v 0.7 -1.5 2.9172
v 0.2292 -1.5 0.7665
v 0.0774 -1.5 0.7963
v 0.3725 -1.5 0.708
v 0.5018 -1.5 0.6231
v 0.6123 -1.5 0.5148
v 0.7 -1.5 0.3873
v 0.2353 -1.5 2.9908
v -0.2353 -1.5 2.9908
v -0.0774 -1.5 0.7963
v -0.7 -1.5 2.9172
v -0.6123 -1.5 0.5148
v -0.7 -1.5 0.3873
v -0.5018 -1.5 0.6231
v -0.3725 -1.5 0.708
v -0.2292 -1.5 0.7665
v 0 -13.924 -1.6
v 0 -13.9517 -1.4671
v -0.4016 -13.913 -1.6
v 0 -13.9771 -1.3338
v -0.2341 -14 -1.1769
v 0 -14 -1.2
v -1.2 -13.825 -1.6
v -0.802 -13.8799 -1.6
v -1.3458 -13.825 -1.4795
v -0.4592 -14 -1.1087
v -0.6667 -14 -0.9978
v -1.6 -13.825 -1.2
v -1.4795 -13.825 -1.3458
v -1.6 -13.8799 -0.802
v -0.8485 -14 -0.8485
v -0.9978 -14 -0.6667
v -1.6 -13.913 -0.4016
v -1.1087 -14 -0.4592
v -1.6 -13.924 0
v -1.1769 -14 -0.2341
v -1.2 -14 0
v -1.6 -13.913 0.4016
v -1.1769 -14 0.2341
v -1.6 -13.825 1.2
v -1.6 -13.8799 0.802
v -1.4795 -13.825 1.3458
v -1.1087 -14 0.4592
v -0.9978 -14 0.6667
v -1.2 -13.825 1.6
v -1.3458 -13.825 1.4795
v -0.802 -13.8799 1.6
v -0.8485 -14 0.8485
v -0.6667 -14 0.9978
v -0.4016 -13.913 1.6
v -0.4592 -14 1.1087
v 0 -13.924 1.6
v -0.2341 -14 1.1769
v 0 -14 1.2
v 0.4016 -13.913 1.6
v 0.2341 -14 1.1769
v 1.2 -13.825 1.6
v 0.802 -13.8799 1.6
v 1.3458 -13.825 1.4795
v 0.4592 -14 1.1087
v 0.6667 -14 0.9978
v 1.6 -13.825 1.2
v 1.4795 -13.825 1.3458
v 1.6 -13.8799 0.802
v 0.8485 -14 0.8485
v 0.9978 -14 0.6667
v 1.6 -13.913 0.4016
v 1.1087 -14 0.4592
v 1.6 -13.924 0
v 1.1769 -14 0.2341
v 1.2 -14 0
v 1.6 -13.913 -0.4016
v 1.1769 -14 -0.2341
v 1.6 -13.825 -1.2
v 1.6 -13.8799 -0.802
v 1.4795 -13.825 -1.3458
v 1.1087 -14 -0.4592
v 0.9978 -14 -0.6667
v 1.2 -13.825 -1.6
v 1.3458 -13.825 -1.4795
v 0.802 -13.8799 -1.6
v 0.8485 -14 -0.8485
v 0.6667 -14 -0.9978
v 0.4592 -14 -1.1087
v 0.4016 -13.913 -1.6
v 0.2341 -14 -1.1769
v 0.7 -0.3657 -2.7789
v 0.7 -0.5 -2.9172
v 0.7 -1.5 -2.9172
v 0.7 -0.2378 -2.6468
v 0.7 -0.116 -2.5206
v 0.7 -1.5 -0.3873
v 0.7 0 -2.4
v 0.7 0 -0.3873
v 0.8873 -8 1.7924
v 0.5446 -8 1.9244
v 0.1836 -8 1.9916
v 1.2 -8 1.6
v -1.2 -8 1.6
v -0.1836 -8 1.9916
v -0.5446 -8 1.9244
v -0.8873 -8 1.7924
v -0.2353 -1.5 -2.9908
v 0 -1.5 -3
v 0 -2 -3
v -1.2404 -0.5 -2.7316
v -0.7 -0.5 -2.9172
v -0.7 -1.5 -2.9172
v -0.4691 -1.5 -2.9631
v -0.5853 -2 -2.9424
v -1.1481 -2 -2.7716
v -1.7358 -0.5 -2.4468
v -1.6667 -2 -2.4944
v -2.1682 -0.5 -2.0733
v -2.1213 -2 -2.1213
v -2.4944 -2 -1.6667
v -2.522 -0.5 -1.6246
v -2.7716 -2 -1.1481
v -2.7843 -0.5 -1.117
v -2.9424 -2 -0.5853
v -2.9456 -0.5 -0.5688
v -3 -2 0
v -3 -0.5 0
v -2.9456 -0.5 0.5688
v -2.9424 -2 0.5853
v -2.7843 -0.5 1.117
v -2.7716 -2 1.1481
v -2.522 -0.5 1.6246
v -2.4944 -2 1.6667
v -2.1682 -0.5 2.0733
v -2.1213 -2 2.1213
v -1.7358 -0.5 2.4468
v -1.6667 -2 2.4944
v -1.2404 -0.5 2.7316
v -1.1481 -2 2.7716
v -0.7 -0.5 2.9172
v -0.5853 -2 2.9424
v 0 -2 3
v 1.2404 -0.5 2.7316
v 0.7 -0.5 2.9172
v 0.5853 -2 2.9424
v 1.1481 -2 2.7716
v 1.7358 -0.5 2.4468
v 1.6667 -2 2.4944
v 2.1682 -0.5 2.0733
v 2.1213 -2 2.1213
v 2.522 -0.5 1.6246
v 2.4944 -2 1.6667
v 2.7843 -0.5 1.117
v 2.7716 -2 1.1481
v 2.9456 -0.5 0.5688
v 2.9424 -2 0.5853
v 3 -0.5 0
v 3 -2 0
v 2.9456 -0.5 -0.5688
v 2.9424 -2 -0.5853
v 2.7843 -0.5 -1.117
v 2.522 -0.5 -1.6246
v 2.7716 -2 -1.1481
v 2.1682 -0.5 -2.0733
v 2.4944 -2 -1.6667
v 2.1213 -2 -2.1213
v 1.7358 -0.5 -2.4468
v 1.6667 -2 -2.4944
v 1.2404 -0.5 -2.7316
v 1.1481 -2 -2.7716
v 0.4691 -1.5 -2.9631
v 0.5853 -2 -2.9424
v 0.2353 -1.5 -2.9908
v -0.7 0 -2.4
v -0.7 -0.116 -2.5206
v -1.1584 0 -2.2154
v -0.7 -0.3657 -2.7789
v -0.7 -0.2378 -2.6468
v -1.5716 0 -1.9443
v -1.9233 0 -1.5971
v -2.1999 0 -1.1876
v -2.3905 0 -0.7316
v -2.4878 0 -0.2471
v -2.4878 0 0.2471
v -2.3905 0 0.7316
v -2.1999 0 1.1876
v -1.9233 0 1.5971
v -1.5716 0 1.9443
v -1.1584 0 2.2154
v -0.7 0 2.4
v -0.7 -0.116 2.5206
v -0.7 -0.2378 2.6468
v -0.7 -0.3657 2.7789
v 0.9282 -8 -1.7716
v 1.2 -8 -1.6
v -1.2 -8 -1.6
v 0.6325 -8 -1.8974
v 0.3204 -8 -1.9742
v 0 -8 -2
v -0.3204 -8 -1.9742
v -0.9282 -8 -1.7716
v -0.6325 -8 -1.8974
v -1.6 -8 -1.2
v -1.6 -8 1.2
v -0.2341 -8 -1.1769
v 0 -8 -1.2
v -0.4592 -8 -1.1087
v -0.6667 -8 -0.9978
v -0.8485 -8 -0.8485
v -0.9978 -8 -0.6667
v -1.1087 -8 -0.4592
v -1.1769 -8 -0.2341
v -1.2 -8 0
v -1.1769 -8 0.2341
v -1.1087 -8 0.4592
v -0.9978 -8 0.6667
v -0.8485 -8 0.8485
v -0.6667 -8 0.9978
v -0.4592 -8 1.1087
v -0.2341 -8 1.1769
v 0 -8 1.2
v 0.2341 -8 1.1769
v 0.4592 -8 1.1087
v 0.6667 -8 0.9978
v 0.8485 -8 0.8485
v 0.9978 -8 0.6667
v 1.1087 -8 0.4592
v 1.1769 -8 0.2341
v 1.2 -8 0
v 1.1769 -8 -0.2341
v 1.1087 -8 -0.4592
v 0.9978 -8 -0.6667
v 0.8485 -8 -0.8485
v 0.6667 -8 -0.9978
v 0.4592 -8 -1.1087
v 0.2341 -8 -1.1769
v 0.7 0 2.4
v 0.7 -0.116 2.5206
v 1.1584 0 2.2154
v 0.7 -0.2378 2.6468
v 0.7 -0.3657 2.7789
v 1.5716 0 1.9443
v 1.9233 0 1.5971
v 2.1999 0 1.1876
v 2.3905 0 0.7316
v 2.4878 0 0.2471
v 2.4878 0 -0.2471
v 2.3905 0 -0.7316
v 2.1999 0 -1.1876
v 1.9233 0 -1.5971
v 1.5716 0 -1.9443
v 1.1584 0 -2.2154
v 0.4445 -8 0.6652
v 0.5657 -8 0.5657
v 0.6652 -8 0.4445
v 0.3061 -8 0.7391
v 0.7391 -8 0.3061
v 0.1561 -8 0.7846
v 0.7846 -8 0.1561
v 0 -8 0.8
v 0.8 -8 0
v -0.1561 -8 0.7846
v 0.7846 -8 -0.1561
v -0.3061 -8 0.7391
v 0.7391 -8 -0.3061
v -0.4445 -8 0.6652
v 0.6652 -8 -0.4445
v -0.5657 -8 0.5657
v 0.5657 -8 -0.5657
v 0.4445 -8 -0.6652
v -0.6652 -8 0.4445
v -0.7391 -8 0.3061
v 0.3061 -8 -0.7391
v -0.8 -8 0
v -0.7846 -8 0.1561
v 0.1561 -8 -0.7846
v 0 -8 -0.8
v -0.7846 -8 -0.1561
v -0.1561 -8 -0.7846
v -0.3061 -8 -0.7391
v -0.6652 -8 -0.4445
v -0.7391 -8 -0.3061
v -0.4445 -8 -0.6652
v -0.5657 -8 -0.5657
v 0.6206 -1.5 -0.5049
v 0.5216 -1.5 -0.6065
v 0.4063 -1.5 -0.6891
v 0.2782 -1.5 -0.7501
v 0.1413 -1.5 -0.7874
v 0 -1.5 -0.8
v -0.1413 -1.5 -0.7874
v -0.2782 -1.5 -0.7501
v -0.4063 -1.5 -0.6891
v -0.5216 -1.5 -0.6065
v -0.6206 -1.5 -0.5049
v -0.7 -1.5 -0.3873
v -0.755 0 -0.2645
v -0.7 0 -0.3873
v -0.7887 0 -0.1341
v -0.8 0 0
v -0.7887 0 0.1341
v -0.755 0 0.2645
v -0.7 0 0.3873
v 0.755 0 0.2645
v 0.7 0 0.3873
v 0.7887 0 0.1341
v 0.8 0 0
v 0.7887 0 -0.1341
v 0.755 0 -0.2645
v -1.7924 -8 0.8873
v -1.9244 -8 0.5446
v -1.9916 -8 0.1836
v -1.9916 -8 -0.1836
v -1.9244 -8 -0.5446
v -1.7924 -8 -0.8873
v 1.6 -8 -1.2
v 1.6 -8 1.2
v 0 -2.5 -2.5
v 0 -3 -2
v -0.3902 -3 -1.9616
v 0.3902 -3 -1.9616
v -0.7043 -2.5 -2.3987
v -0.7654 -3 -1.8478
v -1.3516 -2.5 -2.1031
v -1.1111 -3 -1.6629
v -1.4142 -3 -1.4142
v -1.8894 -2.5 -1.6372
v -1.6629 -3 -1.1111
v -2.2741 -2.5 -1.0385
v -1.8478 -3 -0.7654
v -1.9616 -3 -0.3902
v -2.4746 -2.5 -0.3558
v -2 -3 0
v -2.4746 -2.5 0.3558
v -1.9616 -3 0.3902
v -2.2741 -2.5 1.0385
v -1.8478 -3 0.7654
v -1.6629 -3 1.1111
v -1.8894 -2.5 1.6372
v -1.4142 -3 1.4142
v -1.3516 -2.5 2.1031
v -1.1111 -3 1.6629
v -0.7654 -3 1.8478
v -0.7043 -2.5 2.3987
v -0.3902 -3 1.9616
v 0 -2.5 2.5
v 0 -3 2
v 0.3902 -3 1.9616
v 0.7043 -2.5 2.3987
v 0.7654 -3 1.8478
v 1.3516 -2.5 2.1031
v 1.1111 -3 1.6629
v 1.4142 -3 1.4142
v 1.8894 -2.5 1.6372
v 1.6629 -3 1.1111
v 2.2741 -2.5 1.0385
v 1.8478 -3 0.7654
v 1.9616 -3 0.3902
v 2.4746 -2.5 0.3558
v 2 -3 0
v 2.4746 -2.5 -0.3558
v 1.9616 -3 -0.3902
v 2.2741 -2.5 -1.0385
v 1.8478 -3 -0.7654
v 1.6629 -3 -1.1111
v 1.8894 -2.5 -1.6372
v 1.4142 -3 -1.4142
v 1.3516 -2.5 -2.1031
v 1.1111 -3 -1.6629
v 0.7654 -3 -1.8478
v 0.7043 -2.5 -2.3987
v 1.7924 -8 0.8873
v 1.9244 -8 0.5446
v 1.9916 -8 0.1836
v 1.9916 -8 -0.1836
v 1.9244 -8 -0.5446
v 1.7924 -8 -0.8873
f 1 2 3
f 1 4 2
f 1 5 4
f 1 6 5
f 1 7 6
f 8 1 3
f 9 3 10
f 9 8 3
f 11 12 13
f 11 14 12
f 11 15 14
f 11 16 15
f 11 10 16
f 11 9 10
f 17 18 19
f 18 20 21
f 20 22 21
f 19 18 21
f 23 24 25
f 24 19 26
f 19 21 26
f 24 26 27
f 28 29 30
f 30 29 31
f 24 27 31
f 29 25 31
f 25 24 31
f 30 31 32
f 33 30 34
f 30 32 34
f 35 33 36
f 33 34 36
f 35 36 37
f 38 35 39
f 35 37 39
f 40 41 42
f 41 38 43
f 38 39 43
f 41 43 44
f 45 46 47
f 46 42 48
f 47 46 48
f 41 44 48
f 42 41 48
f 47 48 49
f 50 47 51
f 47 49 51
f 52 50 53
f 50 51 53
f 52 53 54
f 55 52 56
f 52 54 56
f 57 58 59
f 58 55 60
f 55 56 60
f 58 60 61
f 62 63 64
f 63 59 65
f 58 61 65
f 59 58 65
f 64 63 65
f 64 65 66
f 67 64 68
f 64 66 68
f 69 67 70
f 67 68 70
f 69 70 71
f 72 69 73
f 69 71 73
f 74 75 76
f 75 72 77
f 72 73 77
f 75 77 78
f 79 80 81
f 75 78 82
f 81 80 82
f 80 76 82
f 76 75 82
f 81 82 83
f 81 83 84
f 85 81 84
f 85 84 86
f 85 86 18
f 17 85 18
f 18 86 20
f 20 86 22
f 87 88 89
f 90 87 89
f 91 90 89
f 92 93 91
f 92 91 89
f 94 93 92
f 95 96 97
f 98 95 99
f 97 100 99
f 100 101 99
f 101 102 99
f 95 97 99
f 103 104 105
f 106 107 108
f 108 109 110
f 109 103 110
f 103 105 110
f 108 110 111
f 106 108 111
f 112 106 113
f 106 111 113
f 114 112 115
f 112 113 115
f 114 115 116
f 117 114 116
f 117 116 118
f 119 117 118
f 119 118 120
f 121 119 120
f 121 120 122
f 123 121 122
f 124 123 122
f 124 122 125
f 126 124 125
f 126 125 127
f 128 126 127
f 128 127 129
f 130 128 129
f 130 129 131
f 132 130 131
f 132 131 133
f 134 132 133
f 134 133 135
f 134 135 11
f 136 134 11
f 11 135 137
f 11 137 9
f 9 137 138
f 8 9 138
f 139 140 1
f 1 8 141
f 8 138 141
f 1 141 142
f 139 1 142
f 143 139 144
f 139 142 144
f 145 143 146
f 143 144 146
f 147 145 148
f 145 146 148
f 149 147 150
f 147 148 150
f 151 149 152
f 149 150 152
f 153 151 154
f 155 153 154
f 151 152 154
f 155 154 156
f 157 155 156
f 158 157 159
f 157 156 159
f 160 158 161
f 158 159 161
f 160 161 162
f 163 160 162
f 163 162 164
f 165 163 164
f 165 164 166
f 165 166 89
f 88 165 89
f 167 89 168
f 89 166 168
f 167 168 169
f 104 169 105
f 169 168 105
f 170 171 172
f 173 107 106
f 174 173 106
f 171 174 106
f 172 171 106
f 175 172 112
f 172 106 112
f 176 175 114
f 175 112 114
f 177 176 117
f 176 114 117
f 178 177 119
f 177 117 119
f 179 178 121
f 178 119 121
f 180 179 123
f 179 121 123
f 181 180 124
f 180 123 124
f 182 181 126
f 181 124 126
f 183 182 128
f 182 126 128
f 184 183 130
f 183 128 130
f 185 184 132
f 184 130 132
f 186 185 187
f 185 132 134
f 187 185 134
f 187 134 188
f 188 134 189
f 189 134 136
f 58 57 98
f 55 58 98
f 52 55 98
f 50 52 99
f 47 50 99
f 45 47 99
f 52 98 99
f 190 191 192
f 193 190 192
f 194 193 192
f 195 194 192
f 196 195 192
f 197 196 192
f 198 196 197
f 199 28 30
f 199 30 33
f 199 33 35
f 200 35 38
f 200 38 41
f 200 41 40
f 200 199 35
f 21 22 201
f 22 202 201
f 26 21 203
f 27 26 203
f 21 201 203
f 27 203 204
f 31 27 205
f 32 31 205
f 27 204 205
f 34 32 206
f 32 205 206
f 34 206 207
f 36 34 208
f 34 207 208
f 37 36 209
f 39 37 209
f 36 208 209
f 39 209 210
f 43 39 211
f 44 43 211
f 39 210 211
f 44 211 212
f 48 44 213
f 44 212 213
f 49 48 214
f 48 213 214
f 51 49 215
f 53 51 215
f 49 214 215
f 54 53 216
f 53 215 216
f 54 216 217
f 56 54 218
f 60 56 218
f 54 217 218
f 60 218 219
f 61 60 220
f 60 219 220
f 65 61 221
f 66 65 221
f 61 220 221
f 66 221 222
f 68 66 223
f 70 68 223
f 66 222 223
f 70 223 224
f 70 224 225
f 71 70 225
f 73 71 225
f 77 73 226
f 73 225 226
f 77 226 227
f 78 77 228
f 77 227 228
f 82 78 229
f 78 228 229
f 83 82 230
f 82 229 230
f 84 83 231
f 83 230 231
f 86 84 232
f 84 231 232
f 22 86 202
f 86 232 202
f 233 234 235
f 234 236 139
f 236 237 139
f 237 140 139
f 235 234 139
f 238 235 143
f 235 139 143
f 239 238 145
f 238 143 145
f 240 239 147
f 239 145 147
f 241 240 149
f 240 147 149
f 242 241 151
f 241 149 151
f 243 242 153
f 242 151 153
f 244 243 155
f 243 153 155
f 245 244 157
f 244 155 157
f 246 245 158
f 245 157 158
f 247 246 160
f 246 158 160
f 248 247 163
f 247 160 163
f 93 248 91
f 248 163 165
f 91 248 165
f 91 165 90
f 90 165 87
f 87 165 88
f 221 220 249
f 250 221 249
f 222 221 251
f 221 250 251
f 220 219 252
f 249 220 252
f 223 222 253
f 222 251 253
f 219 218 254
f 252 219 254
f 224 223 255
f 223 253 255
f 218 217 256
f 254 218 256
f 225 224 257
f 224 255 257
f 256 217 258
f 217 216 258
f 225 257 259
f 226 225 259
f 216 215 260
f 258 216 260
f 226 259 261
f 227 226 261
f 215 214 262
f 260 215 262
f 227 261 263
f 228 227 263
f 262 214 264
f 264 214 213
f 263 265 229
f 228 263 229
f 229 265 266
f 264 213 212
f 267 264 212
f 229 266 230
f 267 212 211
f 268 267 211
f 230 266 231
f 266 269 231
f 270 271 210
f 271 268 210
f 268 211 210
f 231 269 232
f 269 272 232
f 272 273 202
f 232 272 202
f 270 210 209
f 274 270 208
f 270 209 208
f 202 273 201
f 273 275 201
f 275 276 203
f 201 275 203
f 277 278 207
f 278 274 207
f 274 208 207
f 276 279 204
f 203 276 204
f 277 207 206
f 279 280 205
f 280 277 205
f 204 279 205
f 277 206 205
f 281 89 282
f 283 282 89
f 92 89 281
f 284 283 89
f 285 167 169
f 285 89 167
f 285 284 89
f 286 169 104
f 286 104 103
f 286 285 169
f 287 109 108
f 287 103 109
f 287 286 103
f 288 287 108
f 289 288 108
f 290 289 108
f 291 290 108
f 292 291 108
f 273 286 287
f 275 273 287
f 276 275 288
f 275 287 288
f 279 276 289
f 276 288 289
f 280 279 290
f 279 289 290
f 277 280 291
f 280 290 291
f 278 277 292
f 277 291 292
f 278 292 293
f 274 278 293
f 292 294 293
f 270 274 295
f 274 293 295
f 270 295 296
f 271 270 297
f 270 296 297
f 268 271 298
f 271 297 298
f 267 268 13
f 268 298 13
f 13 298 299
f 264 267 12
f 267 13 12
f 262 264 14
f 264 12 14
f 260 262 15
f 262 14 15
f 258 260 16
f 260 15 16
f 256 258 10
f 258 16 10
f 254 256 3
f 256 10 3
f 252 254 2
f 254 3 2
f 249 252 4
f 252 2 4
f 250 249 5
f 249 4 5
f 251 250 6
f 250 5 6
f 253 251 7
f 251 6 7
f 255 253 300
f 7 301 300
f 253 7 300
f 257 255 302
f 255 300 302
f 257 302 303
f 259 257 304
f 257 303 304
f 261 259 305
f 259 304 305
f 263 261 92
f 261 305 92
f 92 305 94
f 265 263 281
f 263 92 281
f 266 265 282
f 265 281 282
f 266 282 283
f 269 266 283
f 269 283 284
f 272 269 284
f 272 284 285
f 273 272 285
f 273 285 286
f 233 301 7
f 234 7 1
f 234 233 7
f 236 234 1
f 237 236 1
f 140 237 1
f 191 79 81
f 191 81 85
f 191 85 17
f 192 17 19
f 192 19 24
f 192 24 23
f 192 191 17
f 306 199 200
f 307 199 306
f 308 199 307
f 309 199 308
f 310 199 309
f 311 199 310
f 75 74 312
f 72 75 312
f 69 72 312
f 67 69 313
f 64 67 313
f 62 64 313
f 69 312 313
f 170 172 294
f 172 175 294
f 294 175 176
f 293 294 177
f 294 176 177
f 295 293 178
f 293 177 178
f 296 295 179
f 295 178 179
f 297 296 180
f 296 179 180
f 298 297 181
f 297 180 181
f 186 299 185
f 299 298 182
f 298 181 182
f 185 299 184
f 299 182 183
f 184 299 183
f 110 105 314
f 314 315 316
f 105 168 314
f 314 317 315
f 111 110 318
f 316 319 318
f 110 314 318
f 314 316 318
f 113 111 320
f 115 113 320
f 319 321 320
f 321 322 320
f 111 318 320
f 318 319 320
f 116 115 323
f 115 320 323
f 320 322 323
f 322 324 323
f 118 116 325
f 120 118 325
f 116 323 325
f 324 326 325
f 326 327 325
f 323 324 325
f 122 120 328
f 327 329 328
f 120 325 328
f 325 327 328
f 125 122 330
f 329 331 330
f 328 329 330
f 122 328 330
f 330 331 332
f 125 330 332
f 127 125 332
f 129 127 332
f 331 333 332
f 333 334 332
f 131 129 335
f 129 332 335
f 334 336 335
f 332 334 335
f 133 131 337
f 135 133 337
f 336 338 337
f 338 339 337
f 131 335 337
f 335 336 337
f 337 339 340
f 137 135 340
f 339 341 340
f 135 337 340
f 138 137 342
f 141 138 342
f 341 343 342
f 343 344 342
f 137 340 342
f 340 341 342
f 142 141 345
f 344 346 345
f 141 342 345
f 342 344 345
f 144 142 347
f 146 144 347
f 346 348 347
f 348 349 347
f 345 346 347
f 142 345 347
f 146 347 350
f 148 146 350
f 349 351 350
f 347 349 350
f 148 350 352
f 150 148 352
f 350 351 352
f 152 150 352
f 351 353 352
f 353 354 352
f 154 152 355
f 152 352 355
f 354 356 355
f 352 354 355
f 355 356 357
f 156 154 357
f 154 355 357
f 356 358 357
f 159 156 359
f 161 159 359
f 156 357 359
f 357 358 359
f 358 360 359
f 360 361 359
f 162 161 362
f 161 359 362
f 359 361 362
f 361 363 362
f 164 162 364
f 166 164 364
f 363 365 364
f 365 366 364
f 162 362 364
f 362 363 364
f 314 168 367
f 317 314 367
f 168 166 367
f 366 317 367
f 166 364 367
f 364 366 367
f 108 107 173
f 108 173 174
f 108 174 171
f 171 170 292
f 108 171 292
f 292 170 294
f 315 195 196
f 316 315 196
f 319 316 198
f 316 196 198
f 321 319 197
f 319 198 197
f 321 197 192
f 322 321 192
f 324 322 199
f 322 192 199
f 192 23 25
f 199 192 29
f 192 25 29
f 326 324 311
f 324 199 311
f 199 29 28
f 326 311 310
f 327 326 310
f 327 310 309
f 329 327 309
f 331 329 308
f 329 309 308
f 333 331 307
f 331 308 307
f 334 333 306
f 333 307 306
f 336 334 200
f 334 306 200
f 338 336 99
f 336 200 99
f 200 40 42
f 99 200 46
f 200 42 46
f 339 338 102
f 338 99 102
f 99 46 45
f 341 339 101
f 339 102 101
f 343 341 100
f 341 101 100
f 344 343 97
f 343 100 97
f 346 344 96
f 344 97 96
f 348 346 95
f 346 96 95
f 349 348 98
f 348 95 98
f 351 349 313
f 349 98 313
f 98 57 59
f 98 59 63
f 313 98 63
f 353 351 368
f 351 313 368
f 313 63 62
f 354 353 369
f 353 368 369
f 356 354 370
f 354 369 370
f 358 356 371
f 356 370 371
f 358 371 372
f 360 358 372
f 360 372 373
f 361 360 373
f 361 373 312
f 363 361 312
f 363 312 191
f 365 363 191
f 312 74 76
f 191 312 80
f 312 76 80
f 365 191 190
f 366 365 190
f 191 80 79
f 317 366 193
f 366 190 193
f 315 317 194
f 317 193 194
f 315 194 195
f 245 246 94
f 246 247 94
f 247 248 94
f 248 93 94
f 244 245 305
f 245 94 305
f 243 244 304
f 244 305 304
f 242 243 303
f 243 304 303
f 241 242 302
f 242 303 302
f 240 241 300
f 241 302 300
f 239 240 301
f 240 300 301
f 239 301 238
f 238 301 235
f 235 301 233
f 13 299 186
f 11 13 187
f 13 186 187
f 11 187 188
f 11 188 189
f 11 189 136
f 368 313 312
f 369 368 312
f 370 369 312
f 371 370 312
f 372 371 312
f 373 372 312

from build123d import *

# Parameters (mm, degrees)
CHANFREIN1_SIZE         = 0.5
ESQUISSE3_W             = 1.4
ESQUISSE3_H             = 6
ENL_V_MAT_EXTRU_1_DEPTH = 1.5
ENL_V_START             = -8
ESQUISSE4_OUTSIDE_W     = 11.274
ESQUISSE4_OUTSIDE_H     = 11.274
ESQUISSE4_OUTSIDE_W_2   = 3.2
ESQUISSE4_OUTSIDE_H_2   = 3.2
ENL_V_MAT_EXTRU_2_DEPTH = 7


with BuildPart() as part:
    # Esquisse2 → Révolution1 (revolve)
    with BuildSketch(Plane.XY, mode=Mode.PRIVATE) as r_volution1_sk:
        with BuildLine():
            Line((-0.8, 0), (-3, 0))
            Line((-3, 0), (-3, -2))
            Line((-3, -2), (-2, -3))
            Line((-2, -3), (-2, -13.82503854))
            ThreePointArc((-2, -13.82503854), (-1.60238974, -13.923446201), (-1.2, -14))
            Line((-1.2, -14), (-1.2, -8))
            Line((-1.2, -8), (-0.8, -8))
            Line((-0.8, -8), (-0.8, 0))
        make_face()
    revolve(r_volution1_sk.sketch.rotate(Axis((0, -17.325308642, 0), (0, 1, 0)), 270), axis=Axis((0, -17.325308642, 0), (0, 1, 0)))  # turned: the seam where the file's is

    # Chanfrein1
    chanfrein1_edges = [part.edges().sort_by_distance(p)[0] for p in [
        (0, 0, 3),
    ]]
    chamfer(chanfrein1_edges, length=CHANFREIN1_SIZE)

    # Esquisse3 → Enlèv. mat.-Extru.1 (cut)
    with BuildSketch(Plane(origin=(0, 0, 0), x_dir=(-1, 0, 0), z_dir=(0, 1, 0))):
        Rectangle(ESQUISSE3_W, ESQUISSE3_H)
    extrude(amount=-ENL_V_MAT_EXTRU_1_DEPTH, mode=Mode.SUBTRACT)

    # Esquisse4 outside → Enlèv. mat.-Extru.2 (cut, through all)
    with BuildSketch(Plane(origin=(0, 0, 0), x_dir=(-1, 0, 0), z_dir=(0, 1, 0)).offset(ENL_V_START)):
        Rectangle(ESQUISSE4_OUTSIDE_W, ESQUISSE4_OUTSIDE_H)
        Rectangle(ESQUISSE4_OUTSIDE_W_2, ESQUISSE4_OUTSIDE_H_2, mode=Mode.SUBTRACT)
    extrude(amount=-ENL_V_MAT_EXTRU_2_DEPTH, mode=Mode.SUBTRACT)


solid = part.part
